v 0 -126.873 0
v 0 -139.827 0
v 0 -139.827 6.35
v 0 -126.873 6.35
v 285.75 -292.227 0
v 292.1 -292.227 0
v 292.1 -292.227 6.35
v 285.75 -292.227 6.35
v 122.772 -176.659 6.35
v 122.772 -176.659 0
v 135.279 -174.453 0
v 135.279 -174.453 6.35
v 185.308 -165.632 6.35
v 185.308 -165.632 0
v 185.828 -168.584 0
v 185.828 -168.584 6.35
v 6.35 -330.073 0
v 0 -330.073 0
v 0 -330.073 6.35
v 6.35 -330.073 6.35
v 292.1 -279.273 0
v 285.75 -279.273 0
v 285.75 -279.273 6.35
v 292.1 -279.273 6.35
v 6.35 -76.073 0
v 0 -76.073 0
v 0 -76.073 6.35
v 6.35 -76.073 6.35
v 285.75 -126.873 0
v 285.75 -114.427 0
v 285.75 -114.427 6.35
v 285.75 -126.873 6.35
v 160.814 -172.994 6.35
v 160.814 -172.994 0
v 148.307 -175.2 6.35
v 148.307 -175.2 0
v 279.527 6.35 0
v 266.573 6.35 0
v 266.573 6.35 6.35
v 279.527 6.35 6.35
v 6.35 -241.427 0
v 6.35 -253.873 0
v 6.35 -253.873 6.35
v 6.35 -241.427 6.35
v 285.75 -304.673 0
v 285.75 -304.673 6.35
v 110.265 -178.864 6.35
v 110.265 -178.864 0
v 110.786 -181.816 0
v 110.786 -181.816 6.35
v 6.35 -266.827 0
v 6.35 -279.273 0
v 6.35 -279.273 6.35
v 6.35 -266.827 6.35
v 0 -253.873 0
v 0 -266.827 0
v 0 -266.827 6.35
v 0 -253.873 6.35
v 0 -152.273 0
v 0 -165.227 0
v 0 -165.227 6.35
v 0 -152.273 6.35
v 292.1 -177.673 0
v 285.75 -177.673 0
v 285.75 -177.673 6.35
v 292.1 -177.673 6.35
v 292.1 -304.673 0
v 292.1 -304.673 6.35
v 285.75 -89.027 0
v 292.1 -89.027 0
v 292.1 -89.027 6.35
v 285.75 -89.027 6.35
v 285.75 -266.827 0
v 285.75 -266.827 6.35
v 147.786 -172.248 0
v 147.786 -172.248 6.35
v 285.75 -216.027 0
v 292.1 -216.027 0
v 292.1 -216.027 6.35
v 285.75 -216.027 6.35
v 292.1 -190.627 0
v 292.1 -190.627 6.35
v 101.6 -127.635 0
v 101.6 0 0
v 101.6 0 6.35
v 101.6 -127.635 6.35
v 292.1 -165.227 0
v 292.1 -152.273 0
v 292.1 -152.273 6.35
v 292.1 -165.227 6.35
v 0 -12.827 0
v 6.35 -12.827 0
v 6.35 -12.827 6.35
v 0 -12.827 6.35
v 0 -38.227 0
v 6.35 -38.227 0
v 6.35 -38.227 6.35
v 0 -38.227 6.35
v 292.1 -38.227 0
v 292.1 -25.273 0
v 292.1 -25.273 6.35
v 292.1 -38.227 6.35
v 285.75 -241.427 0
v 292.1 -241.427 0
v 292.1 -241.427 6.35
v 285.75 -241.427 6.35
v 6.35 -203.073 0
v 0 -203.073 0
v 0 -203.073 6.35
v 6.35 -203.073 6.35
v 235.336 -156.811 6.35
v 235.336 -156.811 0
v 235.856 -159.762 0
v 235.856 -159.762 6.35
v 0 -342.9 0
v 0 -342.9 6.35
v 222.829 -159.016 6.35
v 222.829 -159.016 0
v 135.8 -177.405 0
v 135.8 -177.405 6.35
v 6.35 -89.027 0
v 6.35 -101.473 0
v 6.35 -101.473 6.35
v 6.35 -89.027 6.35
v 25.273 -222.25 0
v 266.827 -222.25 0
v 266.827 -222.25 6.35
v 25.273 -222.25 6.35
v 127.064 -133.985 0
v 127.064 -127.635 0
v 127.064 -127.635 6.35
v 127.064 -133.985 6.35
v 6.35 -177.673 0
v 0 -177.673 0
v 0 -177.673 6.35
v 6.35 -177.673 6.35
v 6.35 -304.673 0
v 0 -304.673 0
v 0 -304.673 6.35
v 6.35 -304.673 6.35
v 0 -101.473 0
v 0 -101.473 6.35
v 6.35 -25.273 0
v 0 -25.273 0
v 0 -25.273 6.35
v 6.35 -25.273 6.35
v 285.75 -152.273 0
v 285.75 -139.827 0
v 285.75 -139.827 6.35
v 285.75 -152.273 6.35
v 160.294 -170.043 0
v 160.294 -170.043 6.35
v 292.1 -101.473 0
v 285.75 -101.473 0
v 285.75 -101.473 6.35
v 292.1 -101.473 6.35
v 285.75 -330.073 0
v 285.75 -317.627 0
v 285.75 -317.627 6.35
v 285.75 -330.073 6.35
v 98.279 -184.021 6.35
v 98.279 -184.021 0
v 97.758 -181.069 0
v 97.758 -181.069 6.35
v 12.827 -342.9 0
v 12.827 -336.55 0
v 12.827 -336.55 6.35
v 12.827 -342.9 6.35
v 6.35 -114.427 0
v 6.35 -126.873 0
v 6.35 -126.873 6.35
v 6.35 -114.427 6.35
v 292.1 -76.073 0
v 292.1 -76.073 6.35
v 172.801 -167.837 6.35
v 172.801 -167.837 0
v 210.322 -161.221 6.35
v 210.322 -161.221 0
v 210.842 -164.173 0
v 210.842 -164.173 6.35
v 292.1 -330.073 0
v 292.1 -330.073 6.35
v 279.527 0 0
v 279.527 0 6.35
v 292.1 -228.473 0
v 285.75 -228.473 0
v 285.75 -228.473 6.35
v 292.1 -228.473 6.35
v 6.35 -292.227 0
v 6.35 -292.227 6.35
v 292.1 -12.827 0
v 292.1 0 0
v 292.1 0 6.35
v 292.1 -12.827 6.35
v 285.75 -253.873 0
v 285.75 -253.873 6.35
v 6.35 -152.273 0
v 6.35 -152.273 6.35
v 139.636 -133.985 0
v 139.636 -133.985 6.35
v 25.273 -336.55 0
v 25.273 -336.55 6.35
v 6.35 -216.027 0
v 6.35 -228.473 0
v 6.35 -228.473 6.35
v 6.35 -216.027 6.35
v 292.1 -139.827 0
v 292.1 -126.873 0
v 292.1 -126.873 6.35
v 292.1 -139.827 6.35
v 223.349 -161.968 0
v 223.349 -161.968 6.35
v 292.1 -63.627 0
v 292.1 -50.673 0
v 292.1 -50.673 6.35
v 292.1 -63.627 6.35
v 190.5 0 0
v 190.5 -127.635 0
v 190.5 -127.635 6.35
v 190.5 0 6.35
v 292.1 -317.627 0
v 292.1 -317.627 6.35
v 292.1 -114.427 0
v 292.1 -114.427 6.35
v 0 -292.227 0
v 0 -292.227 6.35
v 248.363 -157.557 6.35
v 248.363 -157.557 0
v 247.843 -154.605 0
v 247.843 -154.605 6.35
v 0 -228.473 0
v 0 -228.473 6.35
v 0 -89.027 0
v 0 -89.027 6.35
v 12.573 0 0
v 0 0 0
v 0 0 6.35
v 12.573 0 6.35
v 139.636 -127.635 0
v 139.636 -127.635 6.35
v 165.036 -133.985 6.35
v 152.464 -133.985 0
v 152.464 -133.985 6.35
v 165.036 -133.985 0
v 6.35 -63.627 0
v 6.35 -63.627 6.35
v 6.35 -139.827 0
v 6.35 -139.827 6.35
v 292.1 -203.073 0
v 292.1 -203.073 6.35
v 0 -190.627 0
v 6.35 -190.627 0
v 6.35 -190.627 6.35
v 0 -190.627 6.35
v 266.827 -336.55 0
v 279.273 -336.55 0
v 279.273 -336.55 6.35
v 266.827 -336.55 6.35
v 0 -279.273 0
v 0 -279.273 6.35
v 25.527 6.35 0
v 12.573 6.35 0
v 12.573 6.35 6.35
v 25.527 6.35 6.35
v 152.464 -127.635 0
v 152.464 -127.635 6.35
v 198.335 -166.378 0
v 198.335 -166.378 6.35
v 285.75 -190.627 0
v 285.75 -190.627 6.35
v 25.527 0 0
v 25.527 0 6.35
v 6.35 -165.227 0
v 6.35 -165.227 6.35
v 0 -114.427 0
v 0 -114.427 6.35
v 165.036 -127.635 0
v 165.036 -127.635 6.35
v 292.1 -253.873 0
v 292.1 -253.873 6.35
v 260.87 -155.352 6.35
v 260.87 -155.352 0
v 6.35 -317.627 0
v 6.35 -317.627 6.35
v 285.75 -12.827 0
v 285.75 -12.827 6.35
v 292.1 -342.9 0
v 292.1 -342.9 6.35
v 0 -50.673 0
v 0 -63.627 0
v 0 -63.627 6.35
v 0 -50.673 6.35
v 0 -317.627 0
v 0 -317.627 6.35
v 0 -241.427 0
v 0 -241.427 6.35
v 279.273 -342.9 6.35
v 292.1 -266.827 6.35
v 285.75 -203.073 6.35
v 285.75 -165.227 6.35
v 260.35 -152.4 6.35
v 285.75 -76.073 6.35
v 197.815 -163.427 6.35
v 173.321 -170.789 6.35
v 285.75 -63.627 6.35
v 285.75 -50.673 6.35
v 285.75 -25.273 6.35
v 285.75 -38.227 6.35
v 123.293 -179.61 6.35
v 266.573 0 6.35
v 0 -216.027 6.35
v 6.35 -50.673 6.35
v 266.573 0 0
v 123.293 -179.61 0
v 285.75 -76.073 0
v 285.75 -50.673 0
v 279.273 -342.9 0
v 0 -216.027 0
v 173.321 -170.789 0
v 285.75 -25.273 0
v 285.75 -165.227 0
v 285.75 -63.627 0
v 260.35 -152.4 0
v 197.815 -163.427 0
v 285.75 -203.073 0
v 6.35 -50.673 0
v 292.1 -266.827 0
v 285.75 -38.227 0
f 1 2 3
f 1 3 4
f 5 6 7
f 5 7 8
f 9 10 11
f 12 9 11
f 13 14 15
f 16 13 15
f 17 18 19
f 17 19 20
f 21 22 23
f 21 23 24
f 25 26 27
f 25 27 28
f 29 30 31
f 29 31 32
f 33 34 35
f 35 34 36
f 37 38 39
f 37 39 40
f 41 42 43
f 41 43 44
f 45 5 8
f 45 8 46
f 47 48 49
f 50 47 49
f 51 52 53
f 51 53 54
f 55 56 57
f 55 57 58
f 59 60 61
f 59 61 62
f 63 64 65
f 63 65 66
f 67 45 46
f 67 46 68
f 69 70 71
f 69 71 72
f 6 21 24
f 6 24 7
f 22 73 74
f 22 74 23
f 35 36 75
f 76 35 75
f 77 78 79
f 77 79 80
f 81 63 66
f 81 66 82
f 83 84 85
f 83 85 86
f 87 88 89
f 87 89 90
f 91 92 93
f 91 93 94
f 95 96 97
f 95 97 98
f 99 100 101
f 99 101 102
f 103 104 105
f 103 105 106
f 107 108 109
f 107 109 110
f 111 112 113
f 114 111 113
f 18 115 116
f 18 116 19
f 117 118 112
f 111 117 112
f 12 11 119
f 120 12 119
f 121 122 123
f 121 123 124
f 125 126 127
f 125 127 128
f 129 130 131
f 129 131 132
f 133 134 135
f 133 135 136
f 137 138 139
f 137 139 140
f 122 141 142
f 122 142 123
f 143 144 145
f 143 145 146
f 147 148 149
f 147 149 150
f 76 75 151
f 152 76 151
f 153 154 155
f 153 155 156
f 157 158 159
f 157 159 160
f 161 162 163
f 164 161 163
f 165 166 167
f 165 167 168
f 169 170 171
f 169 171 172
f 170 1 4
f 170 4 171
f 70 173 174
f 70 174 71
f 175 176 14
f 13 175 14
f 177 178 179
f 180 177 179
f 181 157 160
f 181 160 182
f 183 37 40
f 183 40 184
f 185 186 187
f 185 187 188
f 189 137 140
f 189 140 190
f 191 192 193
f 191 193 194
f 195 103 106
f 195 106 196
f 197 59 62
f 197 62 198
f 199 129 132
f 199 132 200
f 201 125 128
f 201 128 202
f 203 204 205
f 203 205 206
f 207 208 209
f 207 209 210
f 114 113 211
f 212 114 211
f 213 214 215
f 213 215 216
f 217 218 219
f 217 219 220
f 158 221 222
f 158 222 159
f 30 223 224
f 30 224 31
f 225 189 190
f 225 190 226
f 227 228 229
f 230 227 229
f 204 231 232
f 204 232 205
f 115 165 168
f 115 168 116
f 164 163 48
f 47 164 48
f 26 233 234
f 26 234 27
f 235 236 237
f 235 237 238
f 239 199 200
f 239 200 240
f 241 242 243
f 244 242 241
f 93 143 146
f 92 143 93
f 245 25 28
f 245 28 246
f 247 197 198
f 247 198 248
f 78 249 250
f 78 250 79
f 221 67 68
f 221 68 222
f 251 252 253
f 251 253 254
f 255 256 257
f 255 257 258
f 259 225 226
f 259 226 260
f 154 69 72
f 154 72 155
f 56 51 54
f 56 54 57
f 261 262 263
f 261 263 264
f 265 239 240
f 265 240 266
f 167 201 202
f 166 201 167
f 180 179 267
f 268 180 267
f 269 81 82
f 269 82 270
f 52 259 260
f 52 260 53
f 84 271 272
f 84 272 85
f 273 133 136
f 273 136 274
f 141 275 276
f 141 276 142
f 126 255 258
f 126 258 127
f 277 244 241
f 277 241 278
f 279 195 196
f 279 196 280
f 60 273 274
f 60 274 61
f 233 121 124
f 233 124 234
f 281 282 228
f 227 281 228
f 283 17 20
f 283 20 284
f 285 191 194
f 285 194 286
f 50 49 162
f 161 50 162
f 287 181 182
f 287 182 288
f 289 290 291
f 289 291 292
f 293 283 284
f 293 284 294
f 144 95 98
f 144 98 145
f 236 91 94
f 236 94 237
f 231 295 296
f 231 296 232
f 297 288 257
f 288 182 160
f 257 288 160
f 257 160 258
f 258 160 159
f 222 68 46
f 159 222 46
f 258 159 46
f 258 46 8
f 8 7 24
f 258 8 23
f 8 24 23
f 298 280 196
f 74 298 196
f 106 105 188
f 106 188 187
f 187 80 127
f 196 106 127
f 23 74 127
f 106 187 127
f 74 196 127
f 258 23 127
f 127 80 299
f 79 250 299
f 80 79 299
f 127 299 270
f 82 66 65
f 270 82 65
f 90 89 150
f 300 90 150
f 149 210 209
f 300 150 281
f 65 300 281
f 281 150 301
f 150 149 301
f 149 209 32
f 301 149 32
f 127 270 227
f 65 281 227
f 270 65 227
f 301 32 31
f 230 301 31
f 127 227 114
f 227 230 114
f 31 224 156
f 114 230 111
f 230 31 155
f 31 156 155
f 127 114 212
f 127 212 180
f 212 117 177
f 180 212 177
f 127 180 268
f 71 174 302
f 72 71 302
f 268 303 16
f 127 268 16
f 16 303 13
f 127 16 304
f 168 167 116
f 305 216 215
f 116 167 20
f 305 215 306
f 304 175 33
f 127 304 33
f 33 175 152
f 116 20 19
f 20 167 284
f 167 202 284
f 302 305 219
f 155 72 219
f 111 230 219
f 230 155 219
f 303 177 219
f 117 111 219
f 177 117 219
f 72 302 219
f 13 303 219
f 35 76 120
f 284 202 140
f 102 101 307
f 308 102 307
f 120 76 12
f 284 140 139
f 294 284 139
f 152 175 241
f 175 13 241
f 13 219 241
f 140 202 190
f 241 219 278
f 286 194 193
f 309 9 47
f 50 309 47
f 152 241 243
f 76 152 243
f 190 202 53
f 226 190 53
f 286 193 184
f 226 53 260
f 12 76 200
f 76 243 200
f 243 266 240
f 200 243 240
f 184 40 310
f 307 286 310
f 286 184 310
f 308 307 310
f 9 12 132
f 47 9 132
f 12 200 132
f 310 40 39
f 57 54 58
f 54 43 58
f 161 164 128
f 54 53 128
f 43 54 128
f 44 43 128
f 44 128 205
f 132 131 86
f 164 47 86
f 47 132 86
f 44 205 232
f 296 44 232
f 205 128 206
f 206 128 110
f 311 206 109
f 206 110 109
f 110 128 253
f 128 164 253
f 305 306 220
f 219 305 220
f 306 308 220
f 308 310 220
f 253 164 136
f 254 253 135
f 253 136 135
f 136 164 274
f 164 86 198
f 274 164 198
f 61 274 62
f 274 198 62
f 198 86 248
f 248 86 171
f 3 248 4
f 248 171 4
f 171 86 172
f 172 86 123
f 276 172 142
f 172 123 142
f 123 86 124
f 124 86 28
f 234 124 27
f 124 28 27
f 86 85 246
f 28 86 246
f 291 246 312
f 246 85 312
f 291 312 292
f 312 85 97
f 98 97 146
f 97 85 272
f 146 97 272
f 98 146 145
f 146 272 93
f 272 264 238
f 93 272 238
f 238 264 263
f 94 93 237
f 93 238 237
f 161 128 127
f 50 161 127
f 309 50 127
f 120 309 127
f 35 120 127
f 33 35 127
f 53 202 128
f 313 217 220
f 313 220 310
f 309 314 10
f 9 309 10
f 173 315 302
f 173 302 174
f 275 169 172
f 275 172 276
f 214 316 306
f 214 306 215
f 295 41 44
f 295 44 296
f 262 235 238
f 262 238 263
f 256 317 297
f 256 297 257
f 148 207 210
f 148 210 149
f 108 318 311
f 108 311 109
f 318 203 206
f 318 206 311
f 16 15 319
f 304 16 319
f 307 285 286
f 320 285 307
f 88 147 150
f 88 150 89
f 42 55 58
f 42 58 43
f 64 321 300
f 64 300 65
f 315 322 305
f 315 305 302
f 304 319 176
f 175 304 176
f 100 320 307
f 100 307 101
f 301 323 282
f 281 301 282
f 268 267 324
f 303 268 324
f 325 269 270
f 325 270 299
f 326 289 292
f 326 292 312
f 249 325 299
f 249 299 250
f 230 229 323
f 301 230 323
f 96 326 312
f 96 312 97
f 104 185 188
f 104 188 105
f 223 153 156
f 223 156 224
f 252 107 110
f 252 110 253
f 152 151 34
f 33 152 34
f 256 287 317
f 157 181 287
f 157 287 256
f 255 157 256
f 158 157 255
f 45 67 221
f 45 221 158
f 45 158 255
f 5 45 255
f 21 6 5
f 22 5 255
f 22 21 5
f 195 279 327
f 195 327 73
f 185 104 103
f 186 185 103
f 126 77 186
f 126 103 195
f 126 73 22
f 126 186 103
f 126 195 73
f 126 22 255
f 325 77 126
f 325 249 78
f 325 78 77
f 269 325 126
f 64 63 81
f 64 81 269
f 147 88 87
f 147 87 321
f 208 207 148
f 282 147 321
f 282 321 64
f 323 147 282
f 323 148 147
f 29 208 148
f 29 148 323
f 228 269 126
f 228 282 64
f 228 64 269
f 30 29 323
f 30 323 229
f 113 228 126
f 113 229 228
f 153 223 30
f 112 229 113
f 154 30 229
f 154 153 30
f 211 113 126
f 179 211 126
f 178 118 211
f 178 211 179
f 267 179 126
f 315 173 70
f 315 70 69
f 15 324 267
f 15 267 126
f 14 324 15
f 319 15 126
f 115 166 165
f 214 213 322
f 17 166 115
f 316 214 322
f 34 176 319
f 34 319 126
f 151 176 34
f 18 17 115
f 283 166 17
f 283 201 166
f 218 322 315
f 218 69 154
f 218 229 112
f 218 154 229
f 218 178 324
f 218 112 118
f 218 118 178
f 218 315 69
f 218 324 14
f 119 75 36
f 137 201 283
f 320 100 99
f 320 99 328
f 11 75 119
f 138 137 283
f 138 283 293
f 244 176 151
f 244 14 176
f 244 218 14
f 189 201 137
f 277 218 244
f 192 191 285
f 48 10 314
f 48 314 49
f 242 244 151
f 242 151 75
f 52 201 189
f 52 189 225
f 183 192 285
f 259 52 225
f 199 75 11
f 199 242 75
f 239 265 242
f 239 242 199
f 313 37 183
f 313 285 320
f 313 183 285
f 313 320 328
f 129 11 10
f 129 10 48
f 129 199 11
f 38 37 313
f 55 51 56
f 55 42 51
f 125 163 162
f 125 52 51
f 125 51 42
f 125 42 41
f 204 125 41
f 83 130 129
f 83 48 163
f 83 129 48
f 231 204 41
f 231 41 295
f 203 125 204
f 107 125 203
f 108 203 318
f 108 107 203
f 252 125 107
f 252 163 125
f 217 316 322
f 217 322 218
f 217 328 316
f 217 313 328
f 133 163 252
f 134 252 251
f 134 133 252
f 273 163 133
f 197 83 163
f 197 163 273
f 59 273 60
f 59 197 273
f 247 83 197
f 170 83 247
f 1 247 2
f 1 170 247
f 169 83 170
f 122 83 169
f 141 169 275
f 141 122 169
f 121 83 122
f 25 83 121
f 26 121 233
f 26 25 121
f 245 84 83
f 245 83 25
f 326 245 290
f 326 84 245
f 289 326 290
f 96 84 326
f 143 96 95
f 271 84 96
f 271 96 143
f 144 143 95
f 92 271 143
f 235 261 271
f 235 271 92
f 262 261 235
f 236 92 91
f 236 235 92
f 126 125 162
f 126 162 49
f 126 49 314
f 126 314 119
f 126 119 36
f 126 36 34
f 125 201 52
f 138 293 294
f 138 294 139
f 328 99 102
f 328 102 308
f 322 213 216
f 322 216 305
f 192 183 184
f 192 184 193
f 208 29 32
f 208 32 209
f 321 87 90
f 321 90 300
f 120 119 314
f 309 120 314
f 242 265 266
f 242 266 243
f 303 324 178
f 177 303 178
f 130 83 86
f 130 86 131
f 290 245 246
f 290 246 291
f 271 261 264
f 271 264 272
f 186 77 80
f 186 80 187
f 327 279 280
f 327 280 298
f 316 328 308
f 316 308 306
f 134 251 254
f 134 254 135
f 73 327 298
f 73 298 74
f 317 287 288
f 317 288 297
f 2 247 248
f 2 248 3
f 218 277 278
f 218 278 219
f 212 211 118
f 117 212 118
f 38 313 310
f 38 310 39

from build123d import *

# Parameters (mm, degrees)
BOSS_EXTRUDE1_DEPTH = 6.35


with BuildPart() as part:
    # Sketch1 → Boss-Extrude1 (new body)
    with BuildSketch(Plane.XY):
        Polygon((0, 0), (12.573, 0), (12.573, 6.35), (25.527, 6.35), (25.527, 0), (101.6, 0), (101.6, -127.635), (127.0635, -127.635), (127.0635, -133.985), (139.6365, -133.985), (139.6365, -127.635), (152.4635, -127.635), (152.4635, -133.985), (165.0365, -133.985), (165.0365, -127.635), (190.5, -127.635), (190.5, 0), (266.573, 0), (266.573, 6.35), (279.527, 6.35), (279.527, 0), (292.1, 0), (292.1, -12.827), (285.75, -12.827), (285.75, -25.273), (292.1, -25.273), (292.1, -38.227), (285.75, -38.227), (285.75, -50.673), (292.1, -50.673), (292.1, -63.627), (285.75, -63.627), (285.75, -76.073), (292.1, -76.073), (292.1, -89.027), (285.75, -89.027), (285.75, -101.473), (292.1, -101.473), (292.1, -114.427), (285.75, -114.427), (285.75, -126.873), (292.1, -126.873), (292.1, -139.827), (285.75, -139.827), (285.75, -152.273), (292.1, -152.273), (292.1, -165.227), (285.75, -165.227), (285.75, -177.673), (292.1, -177.673), (292.1, -190.627), (285.75, -190.627), (285.75, -203.073), (292.1, -203.073), (292.1, -216.027), (285.75, -216.027), (285.75, -228.473), (292.1, -228.473), (292.1, -241.427), (285.75, -241.427), (285.75, -253.873), (292.1, -253.873), (292.1, -266.827), (285.75, -266.827), (285.75, -279.273), (292.1, -279.273), (292.1, -292.227), (285.75, -292.227), (285.75, -304.673), (292.1, -304.673), (292.1, -317.627), (285.75, -317.627), (285.75, -330.073), (292.1, -330.073), (292.1, -342.9), (279.273, -342.9), (279.273, -336.55), (266.827, -336.55), (266.827, -222.25), (25.273, -222.25), (25.273, -336.55), (12.827, -336.55), (12.827, -342.9), (0, -342.9), (0, -330.073), (6.35, -330.073), (6.35, -317.627), (0, -317.627), (0, -304.673), (6.35, -304.673), (6.35, -292.227), (0, -292.227), (0, -279.273), (6.35, -279.273), (6.35, -266.827), (0, -266.827), (0, -253.873), (6.35, -253.873), (6.35, -241.427), (0, -241.427), (0, -228.473), (6.35, -228.473), (6.35, -216.027), (0, -216.027), (0, -203.073), (6.35, -203.073), (6.35, -190.627), (0, -190.627), (0, -177.673), (6.35, -177.673), (6.35, -165.227), (0, -165.227), (0, -152.273), (6.35, -152.273), (6.35, -139.827), (0, -139.827), (0, -126.873), (6.35, -126.873), (6.35, -114.427), (0, -114.427), (0, -101.473), (6.35, -101.473), (6.35, -89.027), (0, -89.027), (0, -76.073), (6.35, -76.073), (6.35, -63.627), (0, -63.627), (0, -50.673), (6.35, -50.673), (6.35, -38.227), (0, -38.227), (0, -25.273), (6.35, -25.273), (6.35, -12.827), (0, -12.827), align=None)
        Polygon((260.870458318, -155.351665797), (248.363399855, -157.556997654), (247.842941537, -154.605331856), (260.35, -152.4), align=None, mode=Mode.SUBTRACT)
        Polygon((235.856341392, -159.76232951), (223.349282928, -161.967661366), (222.82882461, -159.015995569), (235.335883073, -156.810663713), align=None, mode=Mode.SUBTRACT)
        Polygon((210.842224465, -164.172993223), (198.335166002, -166.378325079), (197.814707684, -163.426659282), (210.321766147, -161.221327425), align=None, mode=Mode.SUBTRACT)
        Polygon((185.828107539, -168.583656936), (173.321049075, -170.788988792), (172.800590757, -167.837322995), (185.30764922, -165.631991138), align=None, mode=Mode.SUBTRACT)
        Polygon((160.813990612, -172.994320648), (148.306932149, -175.199652505), (147.786473831, -172.247986707), (160.293532294, -170.042654851), align=None, mode=Mode.SUBTRACT)
        Polygon((135.799873686, -177.404984361), (123.292815222, -179.610316217), (122.772356904, -176.65865042), (135.279415367, -174.453318564), align=None, mode=Mode.SUBTRACT)
        Polygon((110.785756759, -181.815648074), (98.278698296, -184.02097993), (97.758239978, -181.069314133), (110.265298441, -178.863982276), align=None, mode=Mode.SUBTRACT)
    extrude(amount=BOSS_EXTRUDE1_DEPTH)


solid = part.part
